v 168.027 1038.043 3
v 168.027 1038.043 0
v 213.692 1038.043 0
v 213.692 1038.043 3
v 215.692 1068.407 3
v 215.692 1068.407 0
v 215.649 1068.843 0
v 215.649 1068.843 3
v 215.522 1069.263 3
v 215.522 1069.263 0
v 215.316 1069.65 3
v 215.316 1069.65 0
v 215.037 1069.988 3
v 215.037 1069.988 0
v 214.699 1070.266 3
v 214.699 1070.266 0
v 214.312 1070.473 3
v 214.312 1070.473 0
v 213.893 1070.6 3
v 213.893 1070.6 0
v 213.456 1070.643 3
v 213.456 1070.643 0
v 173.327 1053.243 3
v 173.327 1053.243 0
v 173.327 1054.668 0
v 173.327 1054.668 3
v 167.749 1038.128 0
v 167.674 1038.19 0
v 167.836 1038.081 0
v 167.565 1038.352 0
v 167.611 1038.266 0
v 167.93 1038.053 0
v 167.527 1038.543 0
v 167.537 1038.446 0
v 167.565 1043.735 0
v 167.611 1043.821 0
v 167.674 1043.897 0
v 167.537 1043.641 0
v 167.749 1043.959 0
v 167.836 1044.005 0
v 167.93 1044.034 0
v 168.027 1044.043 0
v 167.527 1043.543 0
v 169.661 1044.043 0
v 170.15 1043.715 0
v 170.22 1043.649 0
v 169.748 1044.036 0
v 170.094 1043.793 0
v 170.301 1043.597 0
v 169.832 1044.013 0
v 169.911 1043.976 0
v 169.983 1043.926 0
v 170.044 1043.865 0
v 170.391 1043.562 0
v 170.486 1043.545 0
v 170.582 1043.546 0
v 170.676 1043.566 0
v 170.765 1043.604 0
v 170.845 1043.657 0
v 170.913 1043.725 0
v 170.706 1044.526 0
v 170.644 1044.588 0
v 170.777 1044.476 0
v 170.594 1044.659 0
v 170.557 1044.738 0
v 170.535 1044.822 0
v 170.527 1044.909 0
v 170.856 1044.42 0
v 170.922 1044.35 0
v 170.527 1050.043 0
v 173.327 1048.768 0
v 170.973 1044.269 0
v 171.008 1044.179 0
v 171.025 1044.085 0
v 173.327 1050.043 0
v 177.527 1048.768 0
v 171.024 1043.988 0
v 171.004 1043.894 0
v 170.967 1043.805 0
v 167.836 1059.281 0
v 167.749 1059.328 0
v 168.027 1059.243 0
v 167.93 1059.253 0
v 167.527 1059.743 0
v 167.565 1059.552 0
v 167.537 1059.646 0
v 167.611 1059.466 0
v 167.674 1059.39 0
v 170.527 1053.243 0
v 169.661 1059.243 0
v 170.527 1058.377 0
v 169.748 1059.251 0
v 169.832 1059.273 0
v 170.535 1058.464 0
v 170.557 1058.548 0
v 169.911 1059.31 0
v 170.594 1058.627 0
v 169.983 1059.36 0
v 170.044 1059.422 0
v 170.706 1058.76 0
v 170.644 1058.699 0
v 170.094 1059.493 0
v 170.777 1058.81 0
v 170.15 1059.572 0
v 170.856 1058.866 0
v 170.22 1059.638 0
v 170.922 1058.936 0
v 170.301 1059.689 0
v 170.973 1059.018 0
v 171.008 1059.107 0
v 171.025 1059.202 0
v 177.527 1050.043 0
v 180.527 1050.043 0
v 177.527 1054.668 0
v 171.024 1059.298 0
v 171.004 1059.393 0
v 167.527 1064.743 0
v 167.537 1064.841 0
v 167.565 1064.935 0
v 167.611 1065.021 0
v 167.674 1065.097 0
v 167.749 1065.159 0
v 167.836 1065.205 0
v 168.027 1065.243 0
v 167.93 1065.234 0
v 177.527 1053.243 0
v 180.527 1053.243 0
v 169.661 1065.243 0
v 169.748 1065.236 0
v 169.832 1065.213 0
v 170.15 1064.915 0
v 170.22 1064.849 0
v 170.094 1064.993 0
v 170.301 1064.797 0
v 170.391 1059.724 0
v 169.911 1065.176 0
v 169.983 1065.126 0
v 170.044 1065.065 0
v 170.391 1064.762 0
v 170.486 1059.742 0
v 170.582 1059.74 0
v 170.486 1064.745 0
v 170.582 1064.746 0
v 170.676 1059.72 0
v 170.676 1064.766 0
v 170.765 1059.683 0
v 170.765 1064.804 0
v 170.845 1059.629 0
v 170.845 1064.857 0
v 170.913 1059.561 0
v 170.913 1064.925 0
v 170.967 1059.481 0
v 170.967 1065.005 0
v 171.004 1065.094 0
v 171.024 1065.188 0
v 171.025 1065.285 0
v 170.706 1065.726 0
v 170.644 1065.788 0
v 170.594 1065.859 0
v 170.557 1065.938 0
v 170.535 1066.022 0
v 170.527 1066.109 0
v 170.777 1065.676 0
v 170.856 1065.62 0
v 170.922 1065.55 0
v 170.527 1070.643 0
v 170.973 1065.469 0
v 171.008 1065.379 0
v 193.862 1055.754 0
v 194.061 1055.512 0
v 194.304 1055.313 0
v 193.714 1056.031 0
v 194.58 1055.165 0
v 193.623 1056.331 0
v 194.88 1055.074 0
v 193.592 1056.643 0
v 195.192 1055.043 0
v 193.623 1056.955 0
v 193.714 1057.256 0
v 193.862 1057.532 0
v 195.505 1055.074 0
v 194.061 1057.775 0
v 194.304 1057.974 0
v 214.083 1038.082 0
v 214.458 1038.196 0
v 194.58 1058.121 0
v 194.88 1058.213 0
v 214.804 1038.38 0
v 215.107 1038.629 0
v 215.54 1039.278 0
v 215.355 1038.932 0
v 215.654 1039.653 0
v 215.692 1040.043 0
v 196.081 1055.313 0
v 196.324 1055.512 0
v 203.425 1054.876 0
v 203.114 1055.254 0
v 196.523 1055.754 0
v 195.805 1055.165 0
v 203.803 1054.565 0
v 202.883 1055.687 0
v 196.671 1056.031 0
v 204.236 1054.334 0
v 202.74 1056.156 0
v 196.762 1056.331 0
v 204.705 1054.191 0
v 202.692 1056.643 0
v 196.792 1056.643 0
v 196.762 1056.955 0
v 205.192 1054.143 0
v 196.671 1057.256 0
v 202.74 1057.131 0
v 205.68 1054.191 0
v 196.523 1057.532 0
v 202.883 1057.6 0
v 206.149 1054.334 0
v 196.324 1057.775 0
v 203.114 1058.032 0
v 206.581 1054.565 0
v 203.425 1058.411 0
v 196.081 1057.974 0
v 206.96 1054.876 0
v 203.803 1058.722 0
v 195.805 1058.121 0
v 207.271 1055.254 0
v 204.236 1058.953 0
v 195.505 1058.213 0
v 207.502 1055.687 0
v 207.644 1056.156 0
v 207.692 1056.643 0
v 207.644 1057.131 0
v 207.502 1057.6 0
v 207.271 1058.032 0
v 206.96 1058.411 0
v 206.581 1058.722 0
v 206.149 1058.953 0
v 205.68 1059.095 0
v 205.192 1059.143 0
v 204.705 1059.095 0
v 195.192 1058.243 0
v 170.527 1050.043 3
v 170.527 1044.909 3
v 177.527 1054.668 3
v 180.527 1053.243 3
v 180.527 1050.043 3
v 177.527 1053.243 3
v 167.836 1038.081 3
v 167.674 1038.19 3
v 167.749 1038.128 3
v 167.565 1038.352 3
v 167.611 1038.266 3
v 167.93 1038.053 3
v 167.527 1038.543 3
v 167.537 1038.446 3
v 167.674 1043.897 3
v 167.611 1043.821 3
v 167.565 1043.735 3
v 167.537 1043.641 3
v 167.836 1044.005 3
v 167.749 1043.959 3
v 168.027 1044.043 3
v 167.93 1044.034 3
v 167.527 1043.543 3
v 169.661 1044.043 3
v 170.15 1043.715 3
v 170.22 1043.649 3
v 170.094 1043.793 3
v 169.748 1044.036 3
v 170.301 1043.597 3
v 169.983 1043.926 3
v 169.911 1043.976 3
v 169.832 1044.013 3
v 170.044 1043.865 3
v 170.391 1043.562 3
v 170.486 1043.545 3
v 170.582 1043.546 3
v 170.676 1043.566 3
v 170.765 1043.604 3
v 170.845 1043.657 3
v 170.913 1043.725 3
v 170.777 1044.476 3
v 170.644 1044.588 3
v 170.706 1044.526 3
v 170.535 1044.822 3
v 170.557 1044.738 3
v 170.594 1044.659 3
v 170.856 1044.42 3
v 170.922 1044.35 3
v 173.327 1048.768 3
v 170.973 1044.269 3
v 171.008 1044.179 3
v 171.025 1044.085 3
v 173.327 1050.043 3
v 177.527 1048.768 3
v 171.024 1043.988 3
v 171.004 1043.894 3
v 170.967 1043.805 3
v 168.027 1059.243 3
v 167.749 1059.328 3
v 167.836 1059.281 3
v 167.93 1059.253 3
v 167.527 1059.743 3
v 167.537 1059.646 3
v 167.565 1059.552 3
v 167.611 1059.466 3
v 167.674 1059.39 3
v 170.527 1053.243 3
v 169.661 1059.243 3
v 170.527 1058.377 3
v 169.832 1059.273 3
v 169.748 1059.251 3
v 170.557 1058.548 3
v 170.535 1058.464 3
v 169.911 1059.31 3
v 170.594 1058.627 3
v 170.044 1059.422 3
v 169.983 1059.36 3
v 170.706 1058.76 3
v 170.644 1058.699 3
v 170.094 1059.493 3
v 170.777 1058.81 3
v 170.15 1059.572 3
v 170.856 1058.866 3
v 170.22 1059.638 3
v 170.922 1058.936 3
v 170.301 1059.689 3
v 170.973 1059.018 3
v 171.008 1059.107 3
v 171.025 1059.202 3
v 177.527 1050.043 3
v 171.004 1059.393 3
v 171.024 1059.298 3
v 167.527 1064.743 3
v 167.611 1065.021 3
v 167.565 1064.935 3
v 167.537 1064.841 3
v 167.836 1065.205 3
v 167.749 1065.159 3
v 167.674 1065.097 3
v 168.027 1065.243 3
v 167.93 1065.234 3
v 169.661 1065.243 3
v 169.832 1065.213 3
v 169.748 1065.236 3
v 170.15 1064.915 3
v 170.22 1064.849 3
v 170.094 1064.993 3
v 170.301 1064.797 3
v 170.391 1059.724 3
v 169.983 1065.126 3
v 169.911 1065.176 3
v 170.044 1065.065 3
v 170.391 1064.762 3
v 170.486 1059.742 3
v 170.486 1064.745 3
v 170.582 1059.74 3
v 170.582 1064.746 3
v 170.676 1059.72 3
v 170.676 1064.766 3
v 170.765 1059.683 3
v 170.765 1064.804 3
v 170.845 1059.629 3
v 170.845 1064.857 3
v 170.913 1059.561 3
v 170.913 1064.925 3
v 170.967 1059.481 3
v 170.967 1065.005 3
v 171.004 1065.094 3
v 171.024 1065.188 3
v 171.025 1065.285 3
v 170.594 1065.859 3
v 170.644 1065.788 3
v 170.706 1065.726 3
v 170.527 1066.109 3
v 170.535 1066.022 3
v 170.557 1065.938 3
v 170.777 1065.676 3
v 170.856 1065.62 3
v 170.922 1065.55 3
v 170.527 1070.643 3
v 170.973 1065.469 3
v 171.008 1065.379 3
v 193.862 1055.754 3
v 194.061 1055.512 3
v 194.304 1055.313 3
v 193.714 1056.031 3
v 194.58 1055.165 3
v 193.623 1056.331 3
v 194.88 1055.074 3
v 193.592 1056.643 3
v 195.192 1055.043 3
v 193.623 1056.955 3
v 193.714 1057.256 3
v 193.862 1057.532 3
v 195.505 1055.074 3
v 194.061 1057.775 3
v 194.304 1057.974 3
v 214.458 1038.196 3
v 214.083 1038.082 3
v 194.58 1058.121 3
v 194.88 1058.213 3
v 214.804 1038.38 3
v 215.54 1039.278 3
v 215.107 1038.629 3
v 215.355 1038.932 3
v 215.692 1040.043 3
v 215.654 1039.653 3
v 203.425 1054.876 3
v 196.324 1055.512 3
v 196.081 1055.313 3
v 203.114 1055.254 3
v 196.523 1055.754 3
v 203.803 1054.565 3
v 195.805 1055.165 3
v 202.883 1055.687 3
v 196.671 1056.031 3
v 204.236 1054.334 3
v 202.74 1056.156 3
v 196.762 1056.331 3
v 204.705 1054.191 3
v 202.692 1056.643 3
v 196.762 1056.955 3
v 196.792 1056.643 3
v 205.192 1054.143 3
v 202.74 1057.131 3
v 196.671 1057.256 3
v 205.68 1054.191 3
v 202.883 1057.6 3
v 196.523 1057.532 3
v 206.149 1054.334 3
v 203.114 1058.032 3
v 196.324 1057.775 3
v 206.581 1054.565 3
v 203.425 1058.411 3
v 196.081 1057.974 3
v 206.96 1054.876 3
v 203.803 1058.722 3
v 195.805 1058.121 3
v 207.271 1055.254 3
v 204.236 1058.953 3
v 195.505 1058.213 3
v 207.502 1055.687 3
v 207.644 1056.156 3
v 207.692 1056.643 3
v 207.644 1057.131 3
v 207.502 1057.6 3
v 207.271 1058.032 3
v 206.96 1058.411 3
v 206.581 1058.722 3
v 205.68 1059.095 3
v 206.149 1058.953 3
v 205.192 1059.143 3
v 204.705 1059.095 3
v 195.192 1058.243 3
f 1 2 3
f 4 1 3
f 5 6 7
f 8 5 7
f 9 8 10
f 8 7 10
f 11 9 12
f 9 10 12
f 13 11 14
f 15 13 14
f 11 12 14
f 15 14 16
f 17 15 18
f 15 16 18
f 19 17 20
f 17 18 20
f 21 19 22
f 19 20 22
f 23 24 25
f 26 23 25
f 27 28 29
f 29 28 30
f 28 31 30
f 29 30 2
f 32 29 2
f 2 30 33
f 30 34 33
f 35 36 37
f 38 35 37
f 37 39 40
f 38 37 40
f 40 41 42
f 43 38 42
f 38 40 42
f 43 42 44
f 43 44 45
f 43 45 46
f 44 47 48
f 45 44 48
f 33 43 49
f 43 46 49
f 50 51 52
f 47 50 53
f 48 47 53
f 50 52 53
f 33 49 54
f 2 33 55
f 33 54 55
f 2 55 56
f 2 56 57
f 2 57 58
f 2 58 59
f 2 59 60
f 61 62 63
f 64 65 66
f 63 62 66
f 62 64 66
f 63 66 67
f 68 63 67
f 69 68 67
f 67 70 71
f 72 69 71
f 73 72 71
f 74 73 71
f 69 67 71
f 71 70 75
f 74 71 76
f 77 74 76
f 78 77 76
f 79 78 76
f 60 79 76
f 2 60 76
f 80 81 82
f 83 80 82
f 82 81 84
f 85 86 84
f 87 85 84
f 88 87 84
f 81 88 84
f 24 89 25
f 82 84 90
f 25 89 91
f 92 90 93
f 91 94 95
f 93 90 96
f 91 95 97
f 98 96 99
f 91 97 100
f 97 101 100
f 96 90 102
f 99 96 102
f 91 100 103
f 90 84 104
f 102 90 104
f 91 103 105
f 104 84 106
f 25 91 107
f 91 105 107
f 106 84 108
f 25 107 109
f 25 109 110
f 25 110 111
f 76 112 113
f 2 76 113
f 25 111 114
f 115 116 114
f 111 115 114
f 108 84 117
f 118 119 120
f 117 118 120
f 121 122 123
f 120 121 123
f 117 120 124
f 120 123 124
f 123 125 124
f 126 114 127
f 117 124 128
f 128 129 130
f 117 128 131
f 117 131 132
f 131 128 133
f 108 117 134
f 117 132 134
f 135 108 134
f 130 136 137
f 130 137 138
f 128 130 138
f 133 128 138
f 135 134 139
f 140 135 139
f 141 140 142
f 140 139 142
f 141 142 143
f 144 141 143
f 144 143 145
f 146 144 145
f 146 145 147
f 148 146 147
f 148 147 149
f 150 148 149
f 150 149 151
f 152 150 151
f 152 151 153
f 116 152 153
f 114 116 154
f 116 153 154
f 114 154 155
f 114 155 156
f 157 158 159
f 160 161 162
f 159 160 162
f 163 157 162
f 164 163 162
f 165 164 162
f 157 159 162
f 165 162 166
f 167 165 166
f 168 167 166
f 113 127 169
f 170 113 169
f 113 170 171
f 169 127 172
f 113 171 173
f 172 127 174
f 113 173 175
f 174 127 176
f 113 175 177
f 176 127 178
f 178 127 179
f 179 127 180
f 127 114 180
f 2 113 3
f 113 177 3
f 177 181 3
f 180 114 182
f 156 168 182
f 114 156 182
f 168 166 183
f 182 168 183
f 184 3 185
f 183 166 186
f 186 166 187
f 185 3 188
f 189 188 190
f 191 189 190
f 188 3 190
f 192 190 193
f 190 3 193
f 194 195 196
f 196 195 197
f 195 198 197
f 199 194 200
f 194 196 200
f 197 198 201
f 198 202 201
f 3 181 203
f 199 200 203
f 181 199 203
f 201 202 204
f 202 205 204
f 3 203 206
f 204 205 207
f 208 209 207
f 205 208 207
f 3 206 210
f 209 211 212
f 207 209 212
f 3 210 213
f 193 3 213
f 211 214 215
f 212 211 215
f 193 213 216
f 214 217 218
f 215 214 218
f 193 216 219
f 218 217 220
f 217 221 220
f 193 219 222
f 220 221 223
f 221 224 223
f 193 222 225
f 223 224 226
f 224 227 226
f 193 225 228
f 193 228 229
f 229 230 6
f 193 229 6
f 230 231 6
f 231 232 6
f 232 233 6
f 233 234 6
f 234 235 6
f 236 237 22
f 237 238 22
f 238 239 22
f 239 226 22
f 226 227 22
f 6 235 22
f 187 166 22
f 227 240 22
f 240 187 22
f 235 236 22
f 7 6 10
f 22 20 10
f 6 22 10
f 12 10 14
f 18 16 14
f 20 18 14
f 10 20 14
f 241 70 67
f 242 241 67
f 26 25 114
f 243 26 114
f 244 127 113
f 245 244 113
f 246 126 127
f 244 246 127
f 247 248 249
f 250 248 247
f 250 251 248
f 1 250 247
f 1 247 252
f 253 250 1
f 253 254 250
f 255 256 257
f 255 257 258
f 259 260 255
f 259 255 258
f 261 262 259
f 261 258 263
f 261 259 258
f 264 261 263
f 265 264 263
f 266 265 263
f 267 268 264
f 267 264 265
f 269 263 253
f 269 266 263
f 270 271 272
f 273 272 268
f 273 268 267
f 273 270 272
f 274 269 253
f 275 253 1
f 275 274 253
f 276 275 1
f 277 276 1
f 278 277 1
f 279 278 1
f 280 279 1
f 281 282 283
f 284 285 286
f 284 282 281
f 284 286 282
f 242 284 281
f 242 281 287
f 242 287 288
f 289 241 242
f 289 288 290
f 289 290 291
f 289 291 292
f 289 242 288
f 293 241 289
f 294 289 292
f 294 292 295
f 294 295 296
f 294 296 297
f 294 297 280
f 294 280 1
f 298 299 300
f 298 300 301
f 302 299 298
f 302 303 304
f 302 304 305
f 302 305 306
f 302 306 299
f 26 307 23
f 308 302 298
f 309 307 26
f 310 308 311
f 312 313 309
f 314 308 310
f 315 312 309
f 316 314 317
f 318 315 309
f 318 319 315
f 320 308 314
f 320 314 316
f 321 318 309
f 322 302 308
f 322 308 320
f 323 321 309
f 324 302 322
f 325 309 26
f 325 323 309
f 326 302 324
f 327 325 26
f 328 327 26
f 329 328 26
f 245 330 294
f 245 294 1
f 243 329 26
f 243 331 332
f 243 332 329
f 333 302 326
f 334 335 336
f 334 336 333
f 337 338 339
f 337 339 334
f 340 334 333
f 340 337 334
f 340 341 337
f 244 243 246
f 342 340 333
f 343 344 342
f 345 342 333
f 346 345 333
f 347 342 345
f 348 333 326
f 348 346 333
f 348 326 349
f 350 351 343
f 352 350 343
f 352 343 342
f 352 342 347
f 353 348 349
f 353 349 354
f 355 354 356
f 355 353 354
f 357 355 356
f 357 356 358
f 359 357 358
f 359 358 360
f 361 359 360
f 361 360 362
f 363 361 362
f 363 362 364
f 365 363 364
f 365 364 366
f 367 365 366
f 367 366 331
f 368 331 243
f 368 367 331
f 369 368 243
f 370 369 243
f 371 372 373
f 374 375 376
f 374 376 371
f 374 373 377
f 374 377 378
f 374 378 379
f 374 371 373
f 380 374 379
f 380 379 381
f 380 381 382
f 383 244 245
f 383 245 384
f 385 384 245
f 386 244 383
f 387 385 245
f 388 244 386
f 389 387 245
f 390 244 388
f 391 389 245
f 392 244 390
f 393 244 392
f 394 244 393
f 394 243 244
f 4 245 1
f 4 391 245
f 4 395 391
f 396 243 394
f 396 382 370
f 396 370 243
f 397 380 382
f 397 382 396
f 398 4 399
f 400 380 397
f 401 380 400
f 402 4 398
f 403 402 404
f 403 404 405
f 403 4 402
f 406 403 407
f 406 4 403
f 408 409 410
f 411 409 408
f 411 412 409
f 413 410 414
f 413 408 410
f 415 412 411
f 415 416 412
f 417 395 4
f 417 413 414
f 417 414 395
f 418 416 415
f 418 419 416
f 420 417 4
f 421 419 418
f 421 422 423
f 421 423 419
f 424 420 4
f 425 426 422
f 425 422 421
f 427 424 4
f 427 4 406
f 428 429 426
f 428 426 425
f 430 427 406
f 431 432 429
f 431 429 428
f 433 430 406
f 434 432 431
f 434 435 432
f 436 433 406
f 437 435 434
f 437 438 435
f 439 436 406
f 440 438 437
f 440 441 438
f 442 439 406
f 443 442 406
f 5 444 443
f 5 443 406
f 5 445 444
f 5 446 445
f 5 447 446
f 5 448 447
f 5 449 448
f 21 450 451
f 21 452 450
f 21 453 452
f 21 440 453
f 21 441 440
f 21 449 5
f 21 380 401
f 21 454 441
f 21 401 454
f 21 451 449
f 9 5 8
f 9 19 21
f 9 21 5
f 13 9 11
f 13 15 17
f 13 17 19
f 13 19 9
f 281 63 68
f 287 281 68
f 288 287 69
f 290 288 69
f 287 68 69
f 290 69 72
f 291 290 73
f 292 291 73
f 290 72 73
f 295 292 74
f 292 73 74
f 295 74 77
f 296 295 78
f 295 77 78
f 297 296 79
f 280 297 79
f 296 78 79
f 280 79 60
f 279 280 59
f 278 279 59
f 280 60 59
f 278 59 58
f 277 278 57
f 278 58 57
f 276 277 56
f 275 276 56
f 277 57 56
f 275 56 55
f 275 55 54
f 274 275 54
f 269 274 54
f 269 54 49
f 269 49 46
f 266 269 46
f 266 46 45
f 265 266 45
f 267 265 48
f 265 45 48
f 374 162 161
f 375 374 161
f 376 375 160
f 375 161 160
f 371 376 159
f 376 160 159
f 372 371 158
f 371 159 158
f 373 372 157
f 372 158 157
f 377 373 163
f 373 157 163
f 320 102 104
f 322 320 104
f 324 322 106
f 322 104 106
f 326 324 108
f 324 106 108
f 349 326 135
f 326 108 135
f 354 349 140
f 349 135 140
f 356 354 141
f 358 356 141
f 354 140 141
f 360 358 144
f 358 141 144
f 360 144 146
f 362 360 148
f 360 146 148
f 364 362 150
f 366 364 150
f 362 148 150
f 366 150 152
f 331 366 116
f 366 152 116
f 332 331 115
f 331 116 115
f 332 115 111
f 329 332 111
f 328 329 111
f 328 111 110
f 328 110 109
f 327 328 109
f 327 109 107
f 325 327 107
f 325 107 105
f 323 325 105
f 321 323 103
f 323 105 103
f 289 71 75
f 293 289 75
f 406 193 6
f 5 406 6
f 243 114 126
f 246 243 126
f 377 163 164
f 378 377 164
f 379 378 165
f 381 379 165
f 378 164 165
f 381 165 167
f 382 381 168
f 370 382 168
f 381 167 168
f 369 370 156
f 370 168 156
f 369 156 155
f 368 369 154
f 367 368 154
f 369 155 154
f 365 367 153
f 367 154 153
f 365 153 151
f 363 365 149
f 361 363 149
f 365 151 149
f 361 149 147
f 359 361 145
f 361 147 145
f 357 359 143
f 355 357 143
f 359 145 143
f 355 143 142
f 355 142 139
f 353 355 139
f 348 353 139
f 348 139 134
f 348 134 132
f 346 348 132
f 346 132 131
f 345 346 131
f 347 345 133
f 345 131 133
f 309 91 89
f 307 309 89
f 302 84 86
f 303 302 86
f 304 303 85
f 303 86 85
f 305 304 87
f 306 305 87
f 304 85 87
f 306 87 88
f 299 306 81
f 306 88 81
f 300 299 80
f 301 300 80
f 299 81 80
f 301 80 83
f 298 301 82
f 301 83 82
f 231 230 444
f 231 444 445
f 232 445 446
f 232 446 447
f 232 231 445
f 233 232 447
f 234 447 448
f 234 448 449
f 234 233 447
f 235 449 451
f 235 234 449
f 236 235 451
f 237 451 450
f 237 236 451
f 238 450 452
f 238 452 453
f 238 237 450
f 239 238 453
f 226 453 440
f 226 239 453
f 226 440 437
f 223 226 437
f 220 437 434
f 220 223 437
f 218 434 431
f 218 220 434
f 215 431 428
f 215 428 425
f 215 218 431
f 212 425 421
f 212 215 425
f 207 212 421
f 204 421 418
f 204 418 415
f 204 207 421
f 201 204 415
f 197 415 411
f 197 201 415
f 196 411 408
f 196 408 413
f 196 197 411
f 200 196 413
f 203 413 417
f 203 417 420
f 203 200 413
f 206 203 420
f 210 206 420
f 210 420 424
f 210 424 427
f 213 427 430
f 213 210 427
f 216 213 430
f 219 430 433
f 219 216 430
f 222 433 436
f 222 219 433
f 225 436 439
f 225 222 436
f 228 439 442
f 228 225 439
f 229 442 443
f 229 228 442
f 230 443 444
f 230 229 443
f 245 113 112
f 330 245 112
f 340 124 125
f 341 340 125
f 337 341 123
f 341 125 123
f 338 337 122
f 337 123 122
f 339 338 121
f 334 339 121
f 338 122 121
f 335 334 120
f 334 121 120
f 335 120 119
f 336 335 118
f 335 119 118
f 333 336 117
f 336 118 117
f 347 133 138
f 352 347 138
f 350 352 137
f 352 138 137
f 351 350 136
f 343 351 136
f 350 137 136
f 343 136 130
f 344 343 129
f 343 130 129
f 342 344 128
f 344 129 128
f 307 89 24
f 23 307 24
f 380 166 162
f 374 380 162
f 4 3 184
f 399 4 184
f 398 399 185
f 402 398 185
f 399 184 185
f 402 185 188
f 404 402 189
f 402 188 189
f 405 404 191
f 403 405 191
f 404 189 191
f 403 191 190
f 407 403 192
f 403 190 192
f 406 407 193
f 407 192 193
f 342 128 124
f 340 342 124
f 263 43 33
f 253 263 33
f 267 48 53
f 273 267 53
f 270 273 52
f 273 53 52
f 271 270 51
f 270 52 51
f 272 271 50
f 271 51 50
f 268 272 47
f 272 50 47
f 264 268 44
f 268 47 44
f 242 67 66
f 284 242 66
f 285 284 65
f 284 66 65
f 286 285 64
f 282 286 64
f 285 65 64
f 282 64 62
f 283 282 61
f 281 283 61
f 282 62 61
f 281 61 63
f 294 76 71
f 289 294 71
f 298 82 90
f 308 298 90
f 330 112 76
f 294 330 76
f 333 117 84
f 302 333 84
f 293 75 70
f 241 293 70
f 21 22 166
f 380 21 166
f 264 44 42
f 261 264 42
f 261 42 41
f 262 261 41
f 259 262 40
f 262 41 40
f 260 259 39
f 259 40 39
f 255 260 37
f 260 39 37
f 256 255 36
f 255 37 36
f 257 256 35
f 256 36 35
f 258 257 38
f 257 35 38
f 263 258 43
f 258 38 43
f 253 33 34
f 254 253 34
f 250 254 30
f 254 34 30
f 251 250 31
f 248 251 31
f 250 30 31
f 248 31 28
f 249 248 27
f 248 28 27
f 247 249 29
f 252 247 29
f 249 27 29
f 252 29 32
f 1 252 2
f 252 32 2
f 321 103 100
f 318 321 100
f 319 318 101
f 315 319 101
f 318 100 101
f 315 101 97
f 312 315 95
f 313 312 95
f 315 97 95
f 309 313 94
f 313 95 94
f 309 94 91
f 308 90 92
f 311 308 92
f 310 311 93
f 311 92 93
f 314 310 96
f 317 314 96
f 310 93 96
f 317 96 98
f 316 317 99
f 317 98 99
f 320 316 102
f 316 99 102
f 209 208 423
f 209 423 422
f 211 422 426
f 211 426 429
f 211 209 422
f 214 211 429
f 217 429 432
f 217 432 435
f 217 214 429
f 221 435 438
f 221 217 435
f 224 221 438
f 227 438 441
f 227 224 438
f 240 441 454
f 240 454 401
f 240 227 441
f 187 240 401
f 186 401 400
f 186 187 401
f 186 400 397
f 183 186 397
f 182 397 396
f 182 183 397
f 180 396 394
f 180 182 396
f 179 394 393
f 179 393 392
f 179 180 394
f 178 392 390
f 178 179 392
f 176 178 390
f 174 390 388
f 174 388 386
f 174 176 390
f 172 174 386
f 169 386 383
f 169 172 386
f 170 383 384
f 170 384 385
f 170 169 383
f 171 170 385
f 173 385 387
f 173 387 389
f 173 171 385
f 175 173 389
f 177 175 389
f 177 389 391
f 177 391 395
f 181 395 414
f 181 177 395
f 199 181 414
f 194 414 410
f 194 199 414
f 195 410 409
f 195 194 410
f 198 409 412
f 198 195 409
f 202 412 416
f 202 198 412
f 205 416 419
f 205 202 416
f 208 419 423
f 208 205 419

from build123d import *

# Parameters (mm, degrees)
SKETCH1_R           = 1.6
SKETCH1_R_2         = 2.5
BOSS_EXTRUDE1_DEPTH = 3


with BuildPart() as part:
    # Sketch1 → Boss-Extrude1 (new body)
    with BuildSketch(Plane.XY):
        with BuildLine():
            Line((168.027079905, 1038.043290918), (213.692404138, 1038.043292418))
            ThreePointArc((213.692404138, 1038.043292418), (215.106618088, 1038.62907792), (215.692405461, 1040.043291095))
            Line((215.692405461, 1040.043291095), (215.692425273, 1068.407217461))
            ThreePointArc((215.692425273, 1068.407217461), (215.037497189, 1069.988356706), (213.456358826, 1070.643286918))
            Line((213.456358826, 1070.643286918), (170.527157049, 1070.643286918))
            Line((170.527157049, 1070.643286918), (170.527154049, 1066.109317918))
            ThreePointArc((170.527154049, 1066.109317918), (170.594141198, 1065.85931758), (170.777154049, 1065.67630462))
            ThreePointArc((170.777154049, 1065.67630462), (170.880709235, 1064.889738733), (170.094142887, 1064.993290414))
            ThreePointArc((170.094142887, 1064.993290414), (169.911130301, 1065.176302052), (169.661131049, 1065.243288918))
            Line((169.661131049, 1065.243288918), (168.027102049, 1065.243288918))
            ThreePointArc((168.027102049, 1065.243288918), (167.673548658, 1065.096842309), (167.527102049, 1064.743288918))
            Line((167.527102049, 1064.743288918), (167.527102049, 1059.743291918))
            ThreePointArc((167.527102049, 1059.743291918), (167.673545881, 1059.389741498), (168.027094, 1059.243292111))
            Line((168.027094, 1059.243292111), (169.661121, 1059.243294985))
            ThreePointArc((169.661121, 1059.243294985), (169.911120776, 1059.310282365), (170.094133317, 1059.493294952))
            ThreePointArc((170.094133317, 1059.493294952), (170.880698604, 1059.596848318), (170.77714747, 1058.810282737))
            ThreePointArc((170.77714747, 1058.810282737), (170.594135891, 1058.627270291), (170.527148933, 1058.37727121))
            Line((170.527148933, 1058.37727121), (170.527145536, 1053.243292145))
            Line((170.527145536, 1053.243292145), (173.327145536, 1053.243292145))
            Line((173.327145536, 1053.243292145), (173.327146479, 1054.668300832))
            Line((173.327146479, 1054.668300832), (177.527142575, 1054.668300832))
            Line((177.527142575, 1054.668300832), (177.527142575, 1053.243290914))
            Line((177.527142575, 1053.243290914), (180.527142575, 1053.243292145))
            Line((180.527142575, 1053.243292145), (180.527142575, 1050.043292145))
            Line((180.527142575, 1050.043292145), (177.527142575, 1050.043292145))
            Line((177.527142575, 1050.043292145), (177.527142575, 1048.768300832))
            Line((177.527142575, 1048.768300832), (173.327142575, 1048.768300832))
            Line((173.327142575, 1048.768300832), (173.327143418, 1050.043292145))
            Line((173.327143418, 1050.043292145), (170.527143418, 1050.043292145))
            Line((170.527143418, 1050.043292145), (170.527140021, 1044.909316322))
            ThreePointArc((170.527140021, 1044.909316322), (170.594127154, 1044.659316277), (170.777139735, 1044.476303455))
            ThreePointArc((170.777139735, 1044.476303455), (170.8806944, 1043.689737499), (170.094128121, 1043.793289701))
            ThreePointArc((170.094128121, 1043.793289701), (169.911115656, 1043.97630146), (169.661116448, 1044.043288491))
            Line((169.661116448, 1044.043288491), (168.027087448, 1044.043289572))
            ThreePointArc((168.027087448, 1044.043289572), (167.673533961, 1043.896843197), (167.527087117, 1043.543289903))
            Line((167.527087117, 1043.543289903), (167.527083809, 1038.543292903))
            ThreePointArc((167.527083809, 1038.543292903), (167.673528336, 1038.189739609), (168.027079905, 1038.043290918))
        make_face()
        with Locations((195.192419253, 1056.643286172)):
            Circle(SKETCH1_R, mode=Mode.SUBTRACT)
        with Locations((205.192419253, 1056.643286172)):
            Circle(SKETCH1_R_2, mode=Mode.SUBTRACT)
    extrude(amount=BOSS_EXTRUDE1_DEPTH)


solid = part.part
